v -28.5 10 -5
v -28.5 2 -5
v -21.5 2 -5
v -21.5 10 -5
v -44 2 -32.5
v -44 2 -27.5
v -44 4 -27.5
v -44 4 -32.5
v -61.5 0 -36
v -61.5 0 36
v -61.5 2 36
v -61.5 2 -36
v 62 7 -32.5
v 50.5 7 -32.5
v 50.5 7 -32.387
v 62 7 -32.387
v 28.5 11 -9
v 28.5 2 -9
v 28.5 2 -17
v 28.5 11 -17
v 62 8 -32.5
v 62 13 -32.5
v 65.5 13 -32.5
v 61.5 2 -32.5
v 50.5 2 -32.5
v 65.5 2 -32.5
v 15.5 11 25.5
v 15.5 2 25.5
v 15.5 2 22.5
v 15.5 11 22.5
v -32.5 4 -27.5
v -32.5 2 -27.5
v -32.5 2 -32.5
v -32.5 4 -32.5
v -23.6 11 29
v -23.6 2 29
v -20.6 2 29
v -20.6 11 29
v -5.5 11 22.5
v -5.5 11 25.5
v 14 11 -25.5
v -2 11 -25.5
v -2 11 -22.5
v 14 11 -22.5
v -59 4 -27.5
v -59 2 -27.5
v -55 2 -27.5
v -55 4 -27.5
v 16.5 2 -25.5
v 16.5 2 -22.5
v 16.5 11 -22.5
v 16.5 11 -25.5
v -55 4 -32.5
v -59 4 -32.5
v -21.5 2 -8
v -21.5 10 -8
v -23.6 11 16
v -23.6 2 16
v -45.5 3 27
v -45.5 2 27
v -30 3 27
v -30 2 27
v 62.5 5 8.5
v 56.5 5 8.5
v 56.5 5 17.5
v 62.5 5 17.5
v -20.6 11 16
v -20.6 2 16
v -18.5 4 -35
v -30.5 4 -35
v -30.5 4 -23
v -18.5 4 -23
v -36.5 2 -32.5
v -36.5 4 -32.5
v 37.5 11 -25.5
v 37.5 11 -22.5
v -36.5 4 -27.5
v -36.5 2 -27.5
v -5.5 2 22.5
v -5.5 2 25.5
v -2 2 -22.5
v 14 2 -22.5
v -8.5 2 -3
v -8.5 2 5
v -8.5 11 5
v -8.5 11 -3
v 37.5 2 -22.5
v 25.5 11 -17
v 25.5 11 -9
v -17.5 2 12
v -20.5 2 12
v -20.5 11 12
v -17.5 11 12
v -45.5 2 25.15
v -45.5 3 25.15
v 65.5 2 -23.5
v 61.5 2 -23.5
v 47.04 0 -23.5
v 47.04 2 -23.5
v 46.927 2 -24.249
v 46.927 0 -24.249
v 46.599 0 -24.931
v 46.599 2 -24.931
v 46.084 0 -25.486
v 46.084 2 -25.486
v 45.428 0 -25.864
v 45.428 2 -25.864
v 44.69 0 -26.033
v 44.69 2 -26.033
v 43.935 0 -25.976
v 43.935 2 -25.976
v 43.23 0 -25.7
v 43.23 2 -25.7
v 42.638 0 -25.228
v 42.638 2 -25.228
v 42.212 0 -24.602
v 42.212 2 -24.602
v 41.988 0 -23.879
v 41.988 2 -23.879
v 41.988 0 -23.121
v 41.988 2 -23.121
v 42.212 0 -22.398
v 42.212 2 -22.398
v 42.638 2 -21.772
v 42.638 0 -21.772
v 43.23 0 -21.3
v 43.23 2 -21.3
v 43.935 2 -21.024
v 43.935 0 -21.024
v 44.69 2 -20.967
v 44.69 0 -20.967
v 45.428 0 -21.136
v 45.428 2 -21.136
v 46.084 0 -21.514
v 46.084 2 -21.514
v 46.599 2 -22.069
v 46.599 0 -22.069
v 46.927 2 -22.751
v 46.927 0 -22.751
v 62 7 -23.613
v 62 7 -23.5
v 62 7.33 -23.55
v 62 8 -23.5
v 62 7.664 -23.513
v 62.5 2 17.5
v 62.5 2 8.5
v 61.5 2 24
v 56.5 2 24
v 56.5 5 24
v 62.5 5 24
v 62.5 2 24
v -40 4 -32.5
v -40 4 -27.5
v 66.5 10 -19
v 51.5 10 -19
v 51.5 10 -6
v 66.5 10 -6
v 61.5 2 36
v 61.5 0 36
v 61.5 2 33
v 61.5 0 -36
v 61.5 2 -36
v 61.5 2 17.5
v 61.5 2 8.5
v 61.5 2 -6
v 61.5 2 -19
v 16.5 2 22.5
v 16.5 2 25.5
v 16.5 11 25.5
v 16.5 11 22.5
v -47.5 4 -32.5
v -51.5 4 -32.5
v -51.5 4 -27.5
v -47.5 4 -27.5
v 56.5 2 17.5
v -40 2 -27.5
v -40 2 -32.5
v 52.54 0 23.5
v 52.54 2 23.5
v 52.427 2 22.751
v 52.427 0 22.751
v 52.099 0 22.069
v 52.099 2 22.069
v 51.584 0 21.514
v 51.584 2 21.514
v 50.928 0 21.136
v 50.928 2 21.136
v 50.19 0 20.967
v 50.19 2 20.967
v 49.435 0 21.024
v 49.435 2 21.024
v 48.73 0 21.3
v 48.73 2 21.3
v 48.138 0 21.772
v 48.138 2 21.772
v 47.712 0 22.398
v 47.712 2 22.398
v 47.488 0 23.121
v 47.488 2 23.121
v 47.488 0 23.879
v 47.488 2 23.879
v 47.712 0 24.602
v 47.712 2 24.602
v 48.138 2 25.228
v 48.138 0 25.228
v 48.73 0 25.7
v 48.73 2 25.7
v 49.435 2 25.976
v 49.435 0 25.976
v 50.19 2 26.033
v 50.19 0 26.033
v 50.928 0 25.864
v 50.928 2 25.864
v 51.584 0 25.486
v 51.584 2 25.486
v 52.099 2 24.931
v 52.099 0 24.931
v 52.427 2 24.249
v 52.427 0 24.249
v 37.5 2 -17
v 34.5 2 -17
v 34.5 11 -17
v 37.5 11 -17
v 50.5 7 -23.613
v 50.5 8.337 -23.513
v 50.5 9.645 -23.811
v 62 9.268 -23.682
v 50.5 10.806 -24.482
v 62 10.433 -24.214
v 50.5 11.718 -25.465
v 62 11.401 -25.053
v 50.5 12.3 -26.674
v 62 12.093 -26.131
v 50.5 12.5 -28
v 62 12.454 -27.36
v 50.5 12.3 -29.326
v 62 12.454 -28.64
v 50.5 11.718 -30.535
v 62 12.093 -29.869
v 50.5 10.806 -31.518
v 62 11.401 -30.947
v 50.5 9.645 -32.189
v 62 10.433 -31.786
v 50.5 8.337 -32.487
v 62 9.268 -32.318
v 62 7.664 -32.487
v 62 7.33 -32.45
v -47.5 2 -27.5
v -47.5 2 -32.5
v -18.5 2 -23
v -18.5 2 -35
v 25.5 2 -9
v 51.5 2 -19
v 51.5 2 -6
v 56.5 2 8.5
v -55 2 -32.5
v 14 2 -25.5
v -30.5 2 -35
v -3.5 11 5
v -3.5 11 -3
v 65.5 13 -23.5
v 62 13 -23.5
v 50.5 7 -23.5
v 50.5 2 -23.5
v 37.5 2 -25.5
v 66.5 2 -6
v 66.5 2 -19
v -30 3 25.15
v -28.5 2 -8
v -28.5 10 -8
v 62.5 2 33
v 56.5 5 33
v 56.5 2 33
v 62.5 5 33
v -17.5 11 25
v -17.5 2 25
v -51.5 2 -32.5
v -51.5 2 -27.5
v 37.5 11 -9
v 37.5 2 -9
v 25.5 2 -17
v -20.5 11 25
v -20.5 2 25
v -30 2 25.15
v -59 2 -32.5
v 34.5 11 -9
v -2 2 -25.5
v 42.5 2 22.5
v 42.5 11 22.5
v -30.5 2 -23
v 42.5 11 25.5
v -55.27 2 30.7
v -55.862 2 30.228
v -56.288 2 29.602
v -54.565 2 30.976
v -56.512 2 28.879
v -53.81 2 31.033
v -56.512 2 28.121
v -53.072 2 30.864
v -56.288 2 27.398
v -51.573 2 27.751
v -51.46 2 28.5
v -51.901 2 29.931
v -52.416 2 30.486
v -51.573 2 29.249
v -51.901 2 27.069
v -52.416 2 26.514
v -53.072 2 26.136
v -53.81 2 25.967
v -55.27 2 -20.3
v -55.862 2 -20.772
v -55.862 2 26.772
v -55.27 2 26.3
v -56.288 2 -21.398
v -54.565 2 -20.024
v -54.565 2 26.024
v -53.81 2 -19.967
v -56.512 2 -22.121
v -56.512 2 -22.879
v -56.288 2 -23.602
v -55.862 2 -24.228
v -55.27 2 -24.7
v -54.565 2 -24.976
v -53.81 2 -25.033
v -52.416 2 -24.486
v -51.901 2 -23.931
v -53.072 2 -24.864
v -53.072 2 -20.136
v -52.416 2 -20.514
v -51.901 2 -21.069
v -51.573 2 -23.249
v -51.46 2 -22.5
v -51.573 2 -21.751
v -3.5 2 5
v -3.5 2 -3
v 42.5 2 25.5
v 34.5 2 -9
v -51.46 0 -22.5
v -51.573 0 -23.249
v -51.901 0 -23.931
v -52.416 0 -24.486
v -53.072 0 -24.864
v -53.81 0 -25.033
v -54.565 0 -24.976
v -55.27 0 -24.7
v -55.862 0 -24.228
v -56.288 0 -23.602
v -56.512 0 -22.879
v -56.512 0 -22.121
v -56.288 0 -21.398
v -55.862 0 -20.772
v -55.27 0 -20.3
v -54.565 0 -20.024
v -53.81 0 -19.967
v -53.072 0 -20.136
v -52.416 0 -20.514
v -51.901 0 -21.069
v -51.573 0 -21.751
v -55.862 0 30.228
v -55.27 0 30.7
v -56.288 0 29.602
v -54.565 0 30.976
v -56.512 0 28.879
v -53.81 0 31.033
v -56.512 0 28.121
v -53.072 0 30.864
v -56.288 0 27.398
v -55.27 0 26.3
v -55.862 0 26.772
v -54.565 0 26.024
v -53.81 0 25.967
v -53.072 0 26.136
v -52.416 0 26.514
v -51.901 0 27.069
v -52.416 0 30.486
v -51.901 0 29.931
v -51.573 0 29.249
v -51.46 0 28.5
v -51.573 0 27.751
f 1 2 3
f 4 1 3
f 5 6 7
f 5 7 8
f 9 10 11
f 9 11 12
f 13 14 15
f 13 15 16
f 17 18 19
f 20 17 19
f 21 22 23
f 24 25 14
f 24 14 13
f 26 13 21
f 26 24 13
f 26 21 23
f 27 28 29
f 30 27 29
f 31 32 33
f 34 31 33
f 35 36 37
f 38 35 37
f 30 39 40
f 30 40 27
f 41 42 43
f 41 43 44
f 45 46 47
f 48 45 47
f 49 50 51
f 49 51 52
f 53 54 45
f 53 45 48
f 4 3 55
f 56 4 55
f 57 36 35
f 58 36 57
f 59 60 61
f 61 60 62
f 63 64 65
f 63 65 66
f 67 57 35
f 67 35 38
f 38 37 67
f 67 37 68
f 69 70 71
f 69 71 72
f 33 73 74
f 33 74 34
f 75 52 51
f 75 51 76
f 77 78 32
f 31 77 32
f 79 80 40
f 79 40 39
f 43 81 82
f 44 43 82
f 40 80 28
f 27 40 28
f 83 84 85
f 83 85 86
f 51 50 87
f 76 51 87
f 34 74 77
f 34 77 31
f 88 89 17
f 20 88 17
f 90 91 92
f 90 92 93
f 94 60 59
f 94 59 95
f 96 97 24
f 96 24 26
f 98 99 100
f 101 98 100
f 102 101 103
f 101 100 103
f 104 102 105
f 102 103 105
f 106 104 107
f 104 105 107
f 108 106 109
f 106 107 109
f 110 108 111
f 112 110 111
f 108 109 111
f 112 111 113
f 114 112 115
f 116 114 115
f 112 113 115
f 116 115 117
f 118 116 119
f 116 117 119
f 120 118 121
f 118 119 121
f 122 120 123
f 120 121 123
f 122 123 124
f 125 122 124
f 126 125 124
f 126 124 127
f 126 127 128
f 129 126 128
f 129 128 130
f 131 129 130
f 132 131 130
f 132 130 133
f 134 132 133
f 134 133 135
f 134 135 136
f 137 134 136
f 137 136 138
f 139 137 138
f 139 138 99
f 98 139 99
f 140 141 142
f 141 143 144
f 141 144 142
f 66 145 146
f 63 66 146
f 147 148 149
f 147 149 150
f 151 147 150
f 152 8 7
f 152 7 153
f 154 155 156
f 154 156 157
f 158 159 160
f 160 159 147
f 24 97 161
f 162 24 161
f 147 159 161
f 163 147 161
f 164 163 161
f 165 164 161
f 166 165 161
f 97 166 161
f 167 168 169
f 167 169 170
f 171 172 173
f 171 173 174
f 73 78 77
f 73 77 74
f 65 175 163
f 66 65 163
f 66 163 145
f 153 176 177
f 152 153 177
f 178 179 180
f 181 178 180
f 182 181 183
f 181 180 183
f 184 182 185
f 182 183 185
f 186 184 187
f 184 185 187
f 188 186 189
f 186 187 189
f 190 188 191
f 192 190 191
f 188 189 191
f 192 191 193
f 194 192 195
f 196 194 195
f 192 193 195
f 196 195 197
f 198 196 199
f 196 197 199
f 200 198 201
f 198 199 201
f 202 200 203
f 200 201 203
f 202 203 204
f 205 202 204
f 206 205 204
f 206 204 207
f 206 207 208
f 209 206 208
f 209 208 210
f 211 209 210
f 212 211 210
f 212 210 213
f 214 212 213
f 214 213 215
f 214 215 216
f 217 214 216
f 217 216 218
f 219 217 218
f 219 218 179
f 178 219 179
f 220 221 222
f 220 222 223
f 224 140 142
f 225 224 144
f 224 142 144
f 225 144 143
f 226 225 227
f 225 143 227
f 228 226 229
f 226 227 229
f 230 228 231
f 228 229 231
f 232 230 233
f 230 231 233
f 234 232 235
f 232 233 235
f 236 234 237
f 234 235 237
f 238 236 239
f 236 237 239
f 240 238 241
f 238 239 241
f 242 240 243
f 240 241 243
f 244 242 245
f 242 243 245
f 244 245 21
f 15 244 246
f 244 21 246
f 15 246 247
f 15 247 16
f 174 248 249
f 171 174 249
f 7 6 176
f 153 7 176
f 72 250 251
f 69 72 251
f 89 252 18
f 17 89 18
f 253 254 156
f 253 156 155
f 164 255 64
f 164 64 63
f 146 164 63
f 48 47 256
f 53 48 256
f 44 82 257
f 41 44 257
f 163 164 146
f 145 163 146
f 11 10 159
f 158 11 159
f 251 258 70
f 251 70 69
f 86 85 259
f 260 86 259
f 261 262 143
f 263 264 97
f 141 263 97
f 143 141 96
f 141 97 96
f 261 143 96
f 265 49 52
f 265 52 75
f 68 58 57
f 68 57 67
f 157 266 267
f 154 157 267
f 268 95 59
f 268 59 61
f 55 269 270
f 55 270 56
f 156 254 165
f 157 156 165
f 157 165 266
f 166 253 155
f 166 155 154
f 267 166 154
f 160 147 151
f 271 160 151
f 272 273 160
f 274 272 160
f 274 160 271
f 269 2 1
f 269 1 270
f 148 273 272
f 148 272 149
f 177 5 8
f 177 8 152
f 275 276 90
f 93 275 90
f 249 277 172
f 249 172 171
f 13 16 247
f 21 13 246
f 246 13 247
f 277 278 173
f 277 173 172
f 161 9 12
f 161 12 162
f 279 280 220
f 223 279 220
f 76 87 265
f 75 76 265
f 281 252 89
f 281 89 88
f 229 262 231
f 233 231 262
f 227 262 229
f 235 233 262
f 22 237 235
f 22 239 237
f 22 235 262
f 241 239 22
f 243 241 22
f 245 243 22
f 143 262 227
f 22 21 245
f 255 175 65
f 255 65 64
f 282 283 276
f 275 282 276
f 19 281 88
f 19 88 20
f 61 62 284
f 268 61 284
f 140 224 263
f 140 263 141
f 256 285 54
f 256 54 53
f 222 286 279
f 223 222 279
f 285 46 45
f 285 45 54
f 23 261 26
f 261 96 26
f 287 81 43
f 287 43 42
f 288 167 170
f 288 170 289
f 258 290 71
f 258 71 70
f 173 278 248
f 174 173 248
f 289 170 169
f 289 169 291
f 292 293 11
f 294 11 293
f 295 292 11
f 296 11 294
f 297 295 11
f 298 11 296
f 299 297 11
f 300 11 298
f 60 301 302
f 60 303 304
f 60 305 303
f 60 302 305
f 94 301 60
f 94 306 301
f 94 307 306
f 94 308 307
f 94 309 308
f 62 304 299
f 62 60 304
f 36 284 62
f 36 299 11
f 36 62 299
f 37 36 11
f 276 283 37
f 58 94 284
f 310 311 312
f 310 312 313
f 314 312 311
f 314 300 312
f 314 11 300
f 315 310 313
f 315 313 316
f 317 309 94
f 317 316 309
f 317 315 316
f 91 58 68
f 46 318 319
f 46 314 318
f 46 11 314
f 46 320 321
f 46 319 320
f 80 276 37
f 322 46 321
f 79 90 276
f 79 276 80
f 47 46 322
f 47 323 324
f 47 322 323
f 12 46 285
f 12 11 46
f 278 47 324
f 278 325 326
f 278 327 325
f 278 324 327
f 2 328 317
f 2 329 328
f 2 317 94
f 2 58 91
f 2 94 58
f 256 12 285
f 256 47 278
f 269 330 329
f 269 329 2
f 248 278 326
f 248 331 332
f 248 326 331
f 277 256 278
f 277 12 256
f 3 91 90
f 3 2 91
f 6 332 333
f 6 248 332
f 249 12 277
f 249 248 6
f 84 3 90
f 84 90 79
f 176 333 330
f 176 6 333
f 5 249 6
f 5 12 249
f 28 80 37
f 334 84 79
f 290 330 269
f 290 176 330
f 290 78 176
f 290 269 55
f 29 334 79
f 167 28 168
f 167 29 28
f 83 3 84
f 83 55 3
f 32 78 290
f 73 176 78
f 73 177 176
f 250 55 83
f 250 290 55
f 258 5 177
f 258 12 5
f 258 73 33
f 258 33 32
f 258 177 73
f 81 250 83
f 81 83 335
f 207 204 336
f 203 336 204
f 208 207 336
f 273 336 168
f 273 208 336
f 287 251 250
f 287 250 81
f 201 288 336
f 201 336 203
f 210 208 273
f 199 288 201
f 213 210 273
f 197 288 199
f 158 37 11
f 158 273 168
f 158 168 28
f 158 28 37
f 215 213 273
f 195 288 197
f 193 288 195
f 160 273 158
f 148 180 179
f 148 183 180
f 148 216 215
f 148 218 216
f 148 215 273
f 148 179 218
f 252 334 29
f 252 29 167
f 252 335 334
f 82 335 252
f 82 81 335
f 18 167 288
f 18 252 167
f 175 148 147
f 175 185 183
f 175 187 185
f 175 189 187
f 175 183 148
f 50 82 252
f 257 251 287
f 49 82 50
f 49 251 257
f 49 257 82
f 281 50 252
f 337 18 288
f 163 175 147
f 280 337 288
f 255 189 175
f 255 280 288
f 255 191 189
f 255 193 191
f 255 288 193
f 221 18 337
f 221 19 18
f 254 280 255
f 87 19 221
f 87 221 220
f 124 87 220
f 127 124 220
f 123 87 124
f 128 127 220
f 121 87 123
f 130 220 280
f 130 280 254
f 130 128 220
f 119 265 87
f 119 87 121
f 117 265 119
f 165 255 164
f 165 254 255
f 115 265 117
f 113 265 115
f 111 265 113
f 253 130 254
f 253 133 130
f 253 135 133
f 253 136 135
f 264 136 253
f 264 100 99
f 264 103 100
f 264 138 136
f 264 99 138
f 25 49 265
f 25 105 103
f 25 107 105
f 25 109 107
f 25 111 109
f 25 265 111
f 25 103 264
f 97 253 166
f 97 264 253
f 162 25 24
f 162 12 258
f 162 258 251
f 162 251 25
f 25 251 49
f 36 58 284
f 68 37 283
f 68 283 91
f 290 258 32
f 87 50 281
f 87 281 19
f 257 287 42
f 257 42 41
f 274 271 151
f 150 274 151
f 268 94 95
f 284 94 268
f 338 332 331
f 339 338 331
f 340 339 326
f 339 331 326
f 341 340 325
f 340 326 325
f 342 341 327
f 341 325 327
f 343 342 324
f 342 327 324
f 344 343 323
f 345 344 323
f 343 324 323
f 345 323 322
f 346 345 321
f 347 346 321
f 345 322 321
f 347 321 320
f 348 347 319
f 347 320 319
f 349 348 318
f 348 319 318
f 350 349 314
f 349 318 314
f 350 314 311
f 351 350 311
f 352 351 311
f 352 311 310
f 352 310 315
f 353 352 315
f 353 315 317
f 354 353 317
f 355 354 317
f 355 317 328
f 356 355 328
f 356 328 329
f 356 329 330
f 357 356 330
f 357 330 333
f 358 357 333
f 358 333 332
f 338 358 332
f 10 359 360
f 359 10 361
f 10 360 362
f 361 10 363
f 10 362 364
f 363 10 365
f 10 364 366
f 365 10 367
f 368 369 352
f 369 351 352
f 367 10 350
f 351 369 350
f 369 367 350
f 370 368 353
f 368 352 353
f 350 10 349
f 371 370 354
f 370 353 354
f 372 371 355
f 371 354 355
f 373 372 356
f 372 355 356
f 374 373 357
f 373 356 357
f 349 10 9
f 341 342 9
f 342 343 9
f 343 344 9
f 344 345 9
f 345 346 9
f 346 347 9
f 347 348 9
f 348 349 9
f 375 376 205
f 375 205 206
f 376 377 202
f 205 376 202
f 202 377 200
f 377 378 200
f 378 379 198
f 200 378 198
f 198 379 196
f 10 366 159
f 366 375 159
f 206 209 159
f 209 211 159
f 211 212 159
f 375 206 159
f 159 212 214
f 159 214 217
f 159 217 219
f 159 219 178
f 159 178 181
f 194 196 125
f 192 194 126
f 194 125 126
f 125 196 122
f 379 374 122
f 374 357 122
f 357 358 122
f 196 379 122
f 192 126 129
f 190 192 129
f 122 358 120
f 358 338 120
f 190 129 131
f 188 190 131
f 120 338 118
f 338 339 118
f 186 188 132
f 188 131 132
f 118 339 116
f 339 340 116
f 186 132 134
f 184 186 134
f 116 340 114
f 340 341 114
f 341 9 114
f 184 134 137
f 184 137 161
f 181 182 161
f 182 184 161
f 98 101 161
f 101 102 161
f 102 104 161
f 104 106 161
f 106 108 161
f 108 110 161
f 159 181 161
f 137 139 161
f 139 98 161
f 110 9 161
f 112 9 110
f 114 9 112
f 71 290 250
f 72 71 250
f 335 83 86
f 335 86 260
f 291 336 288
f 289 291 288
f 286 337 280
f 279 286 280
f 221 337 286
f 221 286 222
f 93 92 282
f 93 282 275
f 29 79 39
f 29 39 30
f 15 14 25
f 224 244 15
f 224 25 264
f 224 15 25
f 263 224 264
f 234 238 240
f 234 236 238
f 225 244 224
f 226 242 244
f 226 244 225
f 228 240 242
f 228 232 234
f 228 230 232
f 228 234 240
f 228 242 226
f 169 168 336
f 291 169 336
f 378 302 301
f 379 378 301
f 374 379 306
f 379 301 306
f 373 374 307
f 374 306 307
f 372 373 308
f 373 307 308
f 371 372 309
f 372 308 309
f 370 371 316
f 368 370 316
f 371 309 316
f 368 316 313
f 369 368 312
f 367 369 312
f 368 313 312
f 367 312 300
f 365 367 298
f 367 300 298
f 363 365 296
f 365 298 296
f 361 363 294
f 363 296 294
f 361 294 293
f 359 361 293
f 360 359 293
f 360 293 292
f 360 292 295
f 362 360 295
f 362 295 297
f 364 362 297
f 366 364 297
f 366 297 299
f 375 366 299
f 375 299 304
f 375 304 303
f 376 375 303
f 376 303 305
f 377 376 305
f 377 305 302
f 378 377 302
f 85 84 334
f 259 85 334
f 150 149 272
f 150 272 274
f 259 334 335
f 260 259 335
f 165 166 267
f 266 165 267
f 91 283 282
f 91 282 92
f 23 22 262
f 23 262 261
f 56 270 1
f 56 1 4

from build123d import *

# Parameters (mm, degrees)
SKETCH1_W            = 123
SKETCH1_H            = 72
BOSS_EXTRUDE1_DEPTH  = 2
SKETCH2_W            = 6
SKETCH2_H            = 9
BOSS_EXTRUDE2_DEPTH  = 3
SKETCH3_W            = 15
SKETCH3_H            = 9
BOSS_EXTRUDE3_DEPTH  = 5
SKETCH4_W            = 3.5
SKETCH4_H            = 9
BOSS_EXTRUDE4_DEPTH  = 6
SKETCH5_R            = 4.5
BOSS_EXTRUDE5_DEPTH  = 11.5
SKETCH6_W            = 15
SKETCH6_H            = 13
BOSS_EXTRUDE6_DEPTH  = 8
SKETCH7_W            = 26
SKETCH7_H            = 3
SKETCH7_W_2          = 21
SKETCH7_W_3          = 3
SKETCH7_H_2          = 8
SKETCH7_W_4          = 16
SKETCH7_W_5          = 5
SKETCH7_H_3          = 13
BOSS_EXTRUDE7_DEPTH  = 9
SKETCH8_W            = 12
SKETCH8_H            = 12
BOSS_EXTRUDE8_DEPTH  = 2
SKETCH9_W            = 4
SKETCH9_H            = 5
BOSS_EXTRUDE9_DEPTH  = 2
SKETCH11_W           = 7
SKETCH11_H           = 3
BOSS_EXTRUDE11_DEPTH = 8
SKETCH12_W           = 15.5
SKETCH12_H           = 1.85
BOSS_EXTRUDE12_DEPTH = 1
SKETCH13_R           = 2.54
CUT_EXTRUDE1_DEPTH   = 10


with BuildPart() as part:
    # Sketch1 → Boss-Extrude1 (new body)
    with BuildSketch(Plane(origin=(0, 0, 0), x_dir=(1, 0, 0), z_dir=(0, 1, 0))):
        Rectangle(SKETCH1_W, SKETCH1_H)
    extrude(amount=BOSS_EXTRUDE1_DEPTH)

    # Sketch2 → Boss-Extrude2 (add)
    with BuildSketch(Plane(origin=(0, 2, 0), x_dir=(1, 0, 0), z_dir=(0, 1, 0))):
        with Locations((59.5, -28.5)):
            Rectangle(SKETCH2_W, SKETCH2_H)
        with Locations((59.5, -13)):
            Rectangle(SKETCH2_W, SKETCH2_H)
    extrude(amount=BOSS_EXTRUDE2_DEPTH)

    # Sketch3 → Boss-Extrude3 (add)
    with BuildSketch(Plane(origin=(0, 2, 0), x_dir=(1, 0, 0), z_dir=(0, 1, 0))):
        with Locations((58, 28)):
            Rectangle(SKETCH3_W, SKETCH3_H)
    extrude(amount=BOSS_EXTRUDE3_DEPTH)

    # Sketch4 → Boss-Extrude4 (add)
    with BuildSketch(Plane(origin=(0, 7, 0), x_dir=(1, 0, 0), z_dir=(0, 1, 0))):
        with Locations((63.75, 28)):
            Rectangle(SKETCH4_W, SKETCH4_H)
    extrude(amount=BOSS_EXTRUDE4_DEPTH)

    # Sketch5 → Boss-Extrude5 (add)
    with BuildSketch(Plane.ZY.offset(-62)):
        with Locations((-28, 8)):
            Circle(SKETCH5_R)
    extrude(amount=BOSS_EXTRUDE5_DEPTH)

    # Sketch6 → Boss-Extrude6 (add)
    with BuildSketch(Plane(origin=(0, 2, 0), x_dir=(1, 0, 0), z_dir=(0, 1, 0))):
        with Locations((59, 12.5)):
            Rectangle(SKETCH6_W, SKETCH6_H)
    extrude(amount=BOSS_EXTRUDE6_DEPTH)

    # Sketch7 → Boss-Extrude7 (add)
    with BuildSketch(Plane(origin=(0, 2, 0), x_dir=(1, 0, 0), z_dir=(0, 1, 0))):
        with Locations((29.5, -24)):
            Rectangle(SKETCH7_W, SKETCH7_H)
        with Locations((5, -24)):
            Rectangle(SKETCH7_W_2, SKETCH7_H)
        with Locations((27, 24)):
            Rectangle(SKETCH7_W_2, SKETCH7_H)
        with Locations((36, 13)):
            Rectangle(SKETCH7_W_3, SKETCH7_H_2)
        with Locations((6, 24)):
            Rectangle(SKETCH7_W_4, SKETCH7_H)
        with Locations((27, 13)):
            Rectangle(SKETCH7_W_3, SKETCH7_H_2)
        with Locations((-6, -1)):
            Rectangle(SKETCH7_W_5, SKETCH7_H_2)
        with Locations((-19, -18.5)):
            Rectangle(SKETCH7_W_3, SKETCH7_H_3)
        with Locations((-22.1, -22.5)):
            Rectangle(SKETCH7_W_3, SKETCH7_H_3)
    extrude(amount=BOSS_EXTRUDE7_DEPTH)

    # Sketch8 → Boss-Extrude8 (add)
    with BuildSketch(Plane(origin=(0, 2, 0), x_dir=(1, 0, 0), z_dir=(0, 1, 0))):
        with Locations((-24.5, 29)):
            Rectangle(SKETCH8_W, SKETCH8_H)
    extrude(amount=BOSS_EXTRUDE8_DEPTH)

    # Sketch9 → Boss-Extrude9 (add)
    with BuildSketch(Plane(origin=(0, 2, 0), x_dir=(1, 0, 0), z_dir=(0, 1, 0))):
        with Locations((-42, 30)):
            Rectangle(SKETCH9_W, SKETCH9_H)
        with Locations((-49.5, 30)):
            Rectangle(SKETCH9_W, SKETCH9_H)
        with Locations((-57, 30)):
            Rectangle(SKETCH9_W, SKETCH9_H)
        with Locations((-34.5, 30)):
            Rectangle(SKETCH9_W, SKETCH9_H)
    extrude(amount=BOSS_EXTRUDE9_DEPTH)

    # Sketch11 → Boss-Extrude11 (add)
    with BuildSketch(Plane(origin=(0, 2, 0), x_dir=(1, 0, 0), z_dir=(0, 1, 0))):
        with Locations((-25, 6.5)):
            Rectangle(SKETCH11_W, SKETCH11_H)
    extrude(amount=BOSS_EXTRUDE11_DEPTH)

    # Sketch12 → Boss-Extrude12 (add)
    with BuildSketch(Plane(origin=(0, 2, 0), x_dir=(1, 0, 0), z_dir=(0, 1, 0))):
        with Locations((-37.75, -26.075)):
            Rectangle(SKETCH12_W, SKETCH12_H)
    extrude(amount=BOSS_EXTRUDE12_DEPTH)

    # Sketch13 → Cut-Extrude1 (cut)
    with BuildSketch(Plane(origin=(0, 2, 0), x_dir=(1, 0, 0), z_dir=(0, 1, 0))):
        with Locations((-54, -28.5)):
            Circle(SKETCH13_R)
        with Locations((-54, 22.5)):
            Circle(SKETCH13_R)
        with Locations((44.5, 23.5)):
            Circle(SKETCH13_R)
        with Locations((50, -23.5)):
            Circle(SKETCH13_R)
    extrude(amount=-CUT_EXTRUDE1_DEPTH, mode=Mode.SUBTRACT)


solid = part.part
